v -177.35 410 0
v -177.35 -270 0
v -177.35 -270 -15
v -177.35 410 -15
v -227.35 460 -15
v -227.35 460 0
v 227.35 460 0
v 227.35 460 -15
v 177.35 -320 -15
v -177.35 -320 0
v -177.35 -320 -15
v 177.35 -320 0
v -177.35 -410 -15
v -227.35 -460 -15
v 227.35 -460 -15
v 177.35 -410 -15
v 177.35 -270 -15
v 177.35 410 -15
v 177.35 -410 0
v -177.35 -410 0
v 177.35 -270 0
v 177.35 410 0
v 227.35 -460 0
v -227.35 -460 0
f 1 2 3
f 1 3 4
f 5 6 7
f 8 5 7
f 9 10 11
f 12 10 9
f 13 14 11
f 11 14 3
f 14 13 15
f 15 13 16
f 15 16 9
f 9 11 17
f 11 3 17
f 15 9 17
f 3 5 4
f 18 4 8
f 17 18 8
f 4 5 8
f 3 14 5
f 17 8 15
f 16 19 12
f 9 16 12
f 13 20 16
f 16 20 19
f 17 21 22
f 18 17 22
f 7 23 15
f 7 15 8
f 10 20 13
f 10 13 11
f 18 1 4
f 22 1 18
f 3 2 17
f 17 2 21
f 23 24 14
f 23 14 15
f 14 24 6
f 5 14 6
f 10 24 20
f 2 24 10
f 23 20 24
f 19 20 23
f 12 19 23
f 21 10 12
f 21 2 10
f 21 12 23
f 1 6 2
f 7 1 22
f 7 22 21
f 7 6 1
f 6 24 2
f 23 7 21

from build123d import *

# Parameters (mm, degrees)
CROQUIS1_W              = 454.7
CROQUIS1_H              = 920
CROQUIS1_W_2            = 354.7
CROQUIS1_H_2            = 680
SALIENTE_EXTRUIR1_DEPTH = 15
CROQUIS2_W              = 354.7
CROQUIS2_H              = 90
CORTAR_EXTRUIR1_DEPTH   = 15


with BuildPart() as part:
    # Croquis1 → Saliente-Extruir1 (new body)
    with BuildSketch(Plane.XY):
        Rectangle(CROQUIS1_W, CROQUIS1_H)
        with Locations((0, 70)):
            Rectangle(CROQUIS1_W_2, CROQUIS1_H_2, mode=Mode.SUBTRACT)
    extrude(amount=-SALIENTE_EXTRUIR1_DEPTH)

    # Croquis2 → Cortar-Extruir1 (cut)
    with BuildSketch(Plane.XY):
        with Locations((0, -365)):
            Rectangle(CROQUIS2_W, CROQUIS2_H)
    extrude(amount=-CORTAR_EXTRUIR1_DEPTH, mode=Mode.SUBTRACT)


solid = part.part
